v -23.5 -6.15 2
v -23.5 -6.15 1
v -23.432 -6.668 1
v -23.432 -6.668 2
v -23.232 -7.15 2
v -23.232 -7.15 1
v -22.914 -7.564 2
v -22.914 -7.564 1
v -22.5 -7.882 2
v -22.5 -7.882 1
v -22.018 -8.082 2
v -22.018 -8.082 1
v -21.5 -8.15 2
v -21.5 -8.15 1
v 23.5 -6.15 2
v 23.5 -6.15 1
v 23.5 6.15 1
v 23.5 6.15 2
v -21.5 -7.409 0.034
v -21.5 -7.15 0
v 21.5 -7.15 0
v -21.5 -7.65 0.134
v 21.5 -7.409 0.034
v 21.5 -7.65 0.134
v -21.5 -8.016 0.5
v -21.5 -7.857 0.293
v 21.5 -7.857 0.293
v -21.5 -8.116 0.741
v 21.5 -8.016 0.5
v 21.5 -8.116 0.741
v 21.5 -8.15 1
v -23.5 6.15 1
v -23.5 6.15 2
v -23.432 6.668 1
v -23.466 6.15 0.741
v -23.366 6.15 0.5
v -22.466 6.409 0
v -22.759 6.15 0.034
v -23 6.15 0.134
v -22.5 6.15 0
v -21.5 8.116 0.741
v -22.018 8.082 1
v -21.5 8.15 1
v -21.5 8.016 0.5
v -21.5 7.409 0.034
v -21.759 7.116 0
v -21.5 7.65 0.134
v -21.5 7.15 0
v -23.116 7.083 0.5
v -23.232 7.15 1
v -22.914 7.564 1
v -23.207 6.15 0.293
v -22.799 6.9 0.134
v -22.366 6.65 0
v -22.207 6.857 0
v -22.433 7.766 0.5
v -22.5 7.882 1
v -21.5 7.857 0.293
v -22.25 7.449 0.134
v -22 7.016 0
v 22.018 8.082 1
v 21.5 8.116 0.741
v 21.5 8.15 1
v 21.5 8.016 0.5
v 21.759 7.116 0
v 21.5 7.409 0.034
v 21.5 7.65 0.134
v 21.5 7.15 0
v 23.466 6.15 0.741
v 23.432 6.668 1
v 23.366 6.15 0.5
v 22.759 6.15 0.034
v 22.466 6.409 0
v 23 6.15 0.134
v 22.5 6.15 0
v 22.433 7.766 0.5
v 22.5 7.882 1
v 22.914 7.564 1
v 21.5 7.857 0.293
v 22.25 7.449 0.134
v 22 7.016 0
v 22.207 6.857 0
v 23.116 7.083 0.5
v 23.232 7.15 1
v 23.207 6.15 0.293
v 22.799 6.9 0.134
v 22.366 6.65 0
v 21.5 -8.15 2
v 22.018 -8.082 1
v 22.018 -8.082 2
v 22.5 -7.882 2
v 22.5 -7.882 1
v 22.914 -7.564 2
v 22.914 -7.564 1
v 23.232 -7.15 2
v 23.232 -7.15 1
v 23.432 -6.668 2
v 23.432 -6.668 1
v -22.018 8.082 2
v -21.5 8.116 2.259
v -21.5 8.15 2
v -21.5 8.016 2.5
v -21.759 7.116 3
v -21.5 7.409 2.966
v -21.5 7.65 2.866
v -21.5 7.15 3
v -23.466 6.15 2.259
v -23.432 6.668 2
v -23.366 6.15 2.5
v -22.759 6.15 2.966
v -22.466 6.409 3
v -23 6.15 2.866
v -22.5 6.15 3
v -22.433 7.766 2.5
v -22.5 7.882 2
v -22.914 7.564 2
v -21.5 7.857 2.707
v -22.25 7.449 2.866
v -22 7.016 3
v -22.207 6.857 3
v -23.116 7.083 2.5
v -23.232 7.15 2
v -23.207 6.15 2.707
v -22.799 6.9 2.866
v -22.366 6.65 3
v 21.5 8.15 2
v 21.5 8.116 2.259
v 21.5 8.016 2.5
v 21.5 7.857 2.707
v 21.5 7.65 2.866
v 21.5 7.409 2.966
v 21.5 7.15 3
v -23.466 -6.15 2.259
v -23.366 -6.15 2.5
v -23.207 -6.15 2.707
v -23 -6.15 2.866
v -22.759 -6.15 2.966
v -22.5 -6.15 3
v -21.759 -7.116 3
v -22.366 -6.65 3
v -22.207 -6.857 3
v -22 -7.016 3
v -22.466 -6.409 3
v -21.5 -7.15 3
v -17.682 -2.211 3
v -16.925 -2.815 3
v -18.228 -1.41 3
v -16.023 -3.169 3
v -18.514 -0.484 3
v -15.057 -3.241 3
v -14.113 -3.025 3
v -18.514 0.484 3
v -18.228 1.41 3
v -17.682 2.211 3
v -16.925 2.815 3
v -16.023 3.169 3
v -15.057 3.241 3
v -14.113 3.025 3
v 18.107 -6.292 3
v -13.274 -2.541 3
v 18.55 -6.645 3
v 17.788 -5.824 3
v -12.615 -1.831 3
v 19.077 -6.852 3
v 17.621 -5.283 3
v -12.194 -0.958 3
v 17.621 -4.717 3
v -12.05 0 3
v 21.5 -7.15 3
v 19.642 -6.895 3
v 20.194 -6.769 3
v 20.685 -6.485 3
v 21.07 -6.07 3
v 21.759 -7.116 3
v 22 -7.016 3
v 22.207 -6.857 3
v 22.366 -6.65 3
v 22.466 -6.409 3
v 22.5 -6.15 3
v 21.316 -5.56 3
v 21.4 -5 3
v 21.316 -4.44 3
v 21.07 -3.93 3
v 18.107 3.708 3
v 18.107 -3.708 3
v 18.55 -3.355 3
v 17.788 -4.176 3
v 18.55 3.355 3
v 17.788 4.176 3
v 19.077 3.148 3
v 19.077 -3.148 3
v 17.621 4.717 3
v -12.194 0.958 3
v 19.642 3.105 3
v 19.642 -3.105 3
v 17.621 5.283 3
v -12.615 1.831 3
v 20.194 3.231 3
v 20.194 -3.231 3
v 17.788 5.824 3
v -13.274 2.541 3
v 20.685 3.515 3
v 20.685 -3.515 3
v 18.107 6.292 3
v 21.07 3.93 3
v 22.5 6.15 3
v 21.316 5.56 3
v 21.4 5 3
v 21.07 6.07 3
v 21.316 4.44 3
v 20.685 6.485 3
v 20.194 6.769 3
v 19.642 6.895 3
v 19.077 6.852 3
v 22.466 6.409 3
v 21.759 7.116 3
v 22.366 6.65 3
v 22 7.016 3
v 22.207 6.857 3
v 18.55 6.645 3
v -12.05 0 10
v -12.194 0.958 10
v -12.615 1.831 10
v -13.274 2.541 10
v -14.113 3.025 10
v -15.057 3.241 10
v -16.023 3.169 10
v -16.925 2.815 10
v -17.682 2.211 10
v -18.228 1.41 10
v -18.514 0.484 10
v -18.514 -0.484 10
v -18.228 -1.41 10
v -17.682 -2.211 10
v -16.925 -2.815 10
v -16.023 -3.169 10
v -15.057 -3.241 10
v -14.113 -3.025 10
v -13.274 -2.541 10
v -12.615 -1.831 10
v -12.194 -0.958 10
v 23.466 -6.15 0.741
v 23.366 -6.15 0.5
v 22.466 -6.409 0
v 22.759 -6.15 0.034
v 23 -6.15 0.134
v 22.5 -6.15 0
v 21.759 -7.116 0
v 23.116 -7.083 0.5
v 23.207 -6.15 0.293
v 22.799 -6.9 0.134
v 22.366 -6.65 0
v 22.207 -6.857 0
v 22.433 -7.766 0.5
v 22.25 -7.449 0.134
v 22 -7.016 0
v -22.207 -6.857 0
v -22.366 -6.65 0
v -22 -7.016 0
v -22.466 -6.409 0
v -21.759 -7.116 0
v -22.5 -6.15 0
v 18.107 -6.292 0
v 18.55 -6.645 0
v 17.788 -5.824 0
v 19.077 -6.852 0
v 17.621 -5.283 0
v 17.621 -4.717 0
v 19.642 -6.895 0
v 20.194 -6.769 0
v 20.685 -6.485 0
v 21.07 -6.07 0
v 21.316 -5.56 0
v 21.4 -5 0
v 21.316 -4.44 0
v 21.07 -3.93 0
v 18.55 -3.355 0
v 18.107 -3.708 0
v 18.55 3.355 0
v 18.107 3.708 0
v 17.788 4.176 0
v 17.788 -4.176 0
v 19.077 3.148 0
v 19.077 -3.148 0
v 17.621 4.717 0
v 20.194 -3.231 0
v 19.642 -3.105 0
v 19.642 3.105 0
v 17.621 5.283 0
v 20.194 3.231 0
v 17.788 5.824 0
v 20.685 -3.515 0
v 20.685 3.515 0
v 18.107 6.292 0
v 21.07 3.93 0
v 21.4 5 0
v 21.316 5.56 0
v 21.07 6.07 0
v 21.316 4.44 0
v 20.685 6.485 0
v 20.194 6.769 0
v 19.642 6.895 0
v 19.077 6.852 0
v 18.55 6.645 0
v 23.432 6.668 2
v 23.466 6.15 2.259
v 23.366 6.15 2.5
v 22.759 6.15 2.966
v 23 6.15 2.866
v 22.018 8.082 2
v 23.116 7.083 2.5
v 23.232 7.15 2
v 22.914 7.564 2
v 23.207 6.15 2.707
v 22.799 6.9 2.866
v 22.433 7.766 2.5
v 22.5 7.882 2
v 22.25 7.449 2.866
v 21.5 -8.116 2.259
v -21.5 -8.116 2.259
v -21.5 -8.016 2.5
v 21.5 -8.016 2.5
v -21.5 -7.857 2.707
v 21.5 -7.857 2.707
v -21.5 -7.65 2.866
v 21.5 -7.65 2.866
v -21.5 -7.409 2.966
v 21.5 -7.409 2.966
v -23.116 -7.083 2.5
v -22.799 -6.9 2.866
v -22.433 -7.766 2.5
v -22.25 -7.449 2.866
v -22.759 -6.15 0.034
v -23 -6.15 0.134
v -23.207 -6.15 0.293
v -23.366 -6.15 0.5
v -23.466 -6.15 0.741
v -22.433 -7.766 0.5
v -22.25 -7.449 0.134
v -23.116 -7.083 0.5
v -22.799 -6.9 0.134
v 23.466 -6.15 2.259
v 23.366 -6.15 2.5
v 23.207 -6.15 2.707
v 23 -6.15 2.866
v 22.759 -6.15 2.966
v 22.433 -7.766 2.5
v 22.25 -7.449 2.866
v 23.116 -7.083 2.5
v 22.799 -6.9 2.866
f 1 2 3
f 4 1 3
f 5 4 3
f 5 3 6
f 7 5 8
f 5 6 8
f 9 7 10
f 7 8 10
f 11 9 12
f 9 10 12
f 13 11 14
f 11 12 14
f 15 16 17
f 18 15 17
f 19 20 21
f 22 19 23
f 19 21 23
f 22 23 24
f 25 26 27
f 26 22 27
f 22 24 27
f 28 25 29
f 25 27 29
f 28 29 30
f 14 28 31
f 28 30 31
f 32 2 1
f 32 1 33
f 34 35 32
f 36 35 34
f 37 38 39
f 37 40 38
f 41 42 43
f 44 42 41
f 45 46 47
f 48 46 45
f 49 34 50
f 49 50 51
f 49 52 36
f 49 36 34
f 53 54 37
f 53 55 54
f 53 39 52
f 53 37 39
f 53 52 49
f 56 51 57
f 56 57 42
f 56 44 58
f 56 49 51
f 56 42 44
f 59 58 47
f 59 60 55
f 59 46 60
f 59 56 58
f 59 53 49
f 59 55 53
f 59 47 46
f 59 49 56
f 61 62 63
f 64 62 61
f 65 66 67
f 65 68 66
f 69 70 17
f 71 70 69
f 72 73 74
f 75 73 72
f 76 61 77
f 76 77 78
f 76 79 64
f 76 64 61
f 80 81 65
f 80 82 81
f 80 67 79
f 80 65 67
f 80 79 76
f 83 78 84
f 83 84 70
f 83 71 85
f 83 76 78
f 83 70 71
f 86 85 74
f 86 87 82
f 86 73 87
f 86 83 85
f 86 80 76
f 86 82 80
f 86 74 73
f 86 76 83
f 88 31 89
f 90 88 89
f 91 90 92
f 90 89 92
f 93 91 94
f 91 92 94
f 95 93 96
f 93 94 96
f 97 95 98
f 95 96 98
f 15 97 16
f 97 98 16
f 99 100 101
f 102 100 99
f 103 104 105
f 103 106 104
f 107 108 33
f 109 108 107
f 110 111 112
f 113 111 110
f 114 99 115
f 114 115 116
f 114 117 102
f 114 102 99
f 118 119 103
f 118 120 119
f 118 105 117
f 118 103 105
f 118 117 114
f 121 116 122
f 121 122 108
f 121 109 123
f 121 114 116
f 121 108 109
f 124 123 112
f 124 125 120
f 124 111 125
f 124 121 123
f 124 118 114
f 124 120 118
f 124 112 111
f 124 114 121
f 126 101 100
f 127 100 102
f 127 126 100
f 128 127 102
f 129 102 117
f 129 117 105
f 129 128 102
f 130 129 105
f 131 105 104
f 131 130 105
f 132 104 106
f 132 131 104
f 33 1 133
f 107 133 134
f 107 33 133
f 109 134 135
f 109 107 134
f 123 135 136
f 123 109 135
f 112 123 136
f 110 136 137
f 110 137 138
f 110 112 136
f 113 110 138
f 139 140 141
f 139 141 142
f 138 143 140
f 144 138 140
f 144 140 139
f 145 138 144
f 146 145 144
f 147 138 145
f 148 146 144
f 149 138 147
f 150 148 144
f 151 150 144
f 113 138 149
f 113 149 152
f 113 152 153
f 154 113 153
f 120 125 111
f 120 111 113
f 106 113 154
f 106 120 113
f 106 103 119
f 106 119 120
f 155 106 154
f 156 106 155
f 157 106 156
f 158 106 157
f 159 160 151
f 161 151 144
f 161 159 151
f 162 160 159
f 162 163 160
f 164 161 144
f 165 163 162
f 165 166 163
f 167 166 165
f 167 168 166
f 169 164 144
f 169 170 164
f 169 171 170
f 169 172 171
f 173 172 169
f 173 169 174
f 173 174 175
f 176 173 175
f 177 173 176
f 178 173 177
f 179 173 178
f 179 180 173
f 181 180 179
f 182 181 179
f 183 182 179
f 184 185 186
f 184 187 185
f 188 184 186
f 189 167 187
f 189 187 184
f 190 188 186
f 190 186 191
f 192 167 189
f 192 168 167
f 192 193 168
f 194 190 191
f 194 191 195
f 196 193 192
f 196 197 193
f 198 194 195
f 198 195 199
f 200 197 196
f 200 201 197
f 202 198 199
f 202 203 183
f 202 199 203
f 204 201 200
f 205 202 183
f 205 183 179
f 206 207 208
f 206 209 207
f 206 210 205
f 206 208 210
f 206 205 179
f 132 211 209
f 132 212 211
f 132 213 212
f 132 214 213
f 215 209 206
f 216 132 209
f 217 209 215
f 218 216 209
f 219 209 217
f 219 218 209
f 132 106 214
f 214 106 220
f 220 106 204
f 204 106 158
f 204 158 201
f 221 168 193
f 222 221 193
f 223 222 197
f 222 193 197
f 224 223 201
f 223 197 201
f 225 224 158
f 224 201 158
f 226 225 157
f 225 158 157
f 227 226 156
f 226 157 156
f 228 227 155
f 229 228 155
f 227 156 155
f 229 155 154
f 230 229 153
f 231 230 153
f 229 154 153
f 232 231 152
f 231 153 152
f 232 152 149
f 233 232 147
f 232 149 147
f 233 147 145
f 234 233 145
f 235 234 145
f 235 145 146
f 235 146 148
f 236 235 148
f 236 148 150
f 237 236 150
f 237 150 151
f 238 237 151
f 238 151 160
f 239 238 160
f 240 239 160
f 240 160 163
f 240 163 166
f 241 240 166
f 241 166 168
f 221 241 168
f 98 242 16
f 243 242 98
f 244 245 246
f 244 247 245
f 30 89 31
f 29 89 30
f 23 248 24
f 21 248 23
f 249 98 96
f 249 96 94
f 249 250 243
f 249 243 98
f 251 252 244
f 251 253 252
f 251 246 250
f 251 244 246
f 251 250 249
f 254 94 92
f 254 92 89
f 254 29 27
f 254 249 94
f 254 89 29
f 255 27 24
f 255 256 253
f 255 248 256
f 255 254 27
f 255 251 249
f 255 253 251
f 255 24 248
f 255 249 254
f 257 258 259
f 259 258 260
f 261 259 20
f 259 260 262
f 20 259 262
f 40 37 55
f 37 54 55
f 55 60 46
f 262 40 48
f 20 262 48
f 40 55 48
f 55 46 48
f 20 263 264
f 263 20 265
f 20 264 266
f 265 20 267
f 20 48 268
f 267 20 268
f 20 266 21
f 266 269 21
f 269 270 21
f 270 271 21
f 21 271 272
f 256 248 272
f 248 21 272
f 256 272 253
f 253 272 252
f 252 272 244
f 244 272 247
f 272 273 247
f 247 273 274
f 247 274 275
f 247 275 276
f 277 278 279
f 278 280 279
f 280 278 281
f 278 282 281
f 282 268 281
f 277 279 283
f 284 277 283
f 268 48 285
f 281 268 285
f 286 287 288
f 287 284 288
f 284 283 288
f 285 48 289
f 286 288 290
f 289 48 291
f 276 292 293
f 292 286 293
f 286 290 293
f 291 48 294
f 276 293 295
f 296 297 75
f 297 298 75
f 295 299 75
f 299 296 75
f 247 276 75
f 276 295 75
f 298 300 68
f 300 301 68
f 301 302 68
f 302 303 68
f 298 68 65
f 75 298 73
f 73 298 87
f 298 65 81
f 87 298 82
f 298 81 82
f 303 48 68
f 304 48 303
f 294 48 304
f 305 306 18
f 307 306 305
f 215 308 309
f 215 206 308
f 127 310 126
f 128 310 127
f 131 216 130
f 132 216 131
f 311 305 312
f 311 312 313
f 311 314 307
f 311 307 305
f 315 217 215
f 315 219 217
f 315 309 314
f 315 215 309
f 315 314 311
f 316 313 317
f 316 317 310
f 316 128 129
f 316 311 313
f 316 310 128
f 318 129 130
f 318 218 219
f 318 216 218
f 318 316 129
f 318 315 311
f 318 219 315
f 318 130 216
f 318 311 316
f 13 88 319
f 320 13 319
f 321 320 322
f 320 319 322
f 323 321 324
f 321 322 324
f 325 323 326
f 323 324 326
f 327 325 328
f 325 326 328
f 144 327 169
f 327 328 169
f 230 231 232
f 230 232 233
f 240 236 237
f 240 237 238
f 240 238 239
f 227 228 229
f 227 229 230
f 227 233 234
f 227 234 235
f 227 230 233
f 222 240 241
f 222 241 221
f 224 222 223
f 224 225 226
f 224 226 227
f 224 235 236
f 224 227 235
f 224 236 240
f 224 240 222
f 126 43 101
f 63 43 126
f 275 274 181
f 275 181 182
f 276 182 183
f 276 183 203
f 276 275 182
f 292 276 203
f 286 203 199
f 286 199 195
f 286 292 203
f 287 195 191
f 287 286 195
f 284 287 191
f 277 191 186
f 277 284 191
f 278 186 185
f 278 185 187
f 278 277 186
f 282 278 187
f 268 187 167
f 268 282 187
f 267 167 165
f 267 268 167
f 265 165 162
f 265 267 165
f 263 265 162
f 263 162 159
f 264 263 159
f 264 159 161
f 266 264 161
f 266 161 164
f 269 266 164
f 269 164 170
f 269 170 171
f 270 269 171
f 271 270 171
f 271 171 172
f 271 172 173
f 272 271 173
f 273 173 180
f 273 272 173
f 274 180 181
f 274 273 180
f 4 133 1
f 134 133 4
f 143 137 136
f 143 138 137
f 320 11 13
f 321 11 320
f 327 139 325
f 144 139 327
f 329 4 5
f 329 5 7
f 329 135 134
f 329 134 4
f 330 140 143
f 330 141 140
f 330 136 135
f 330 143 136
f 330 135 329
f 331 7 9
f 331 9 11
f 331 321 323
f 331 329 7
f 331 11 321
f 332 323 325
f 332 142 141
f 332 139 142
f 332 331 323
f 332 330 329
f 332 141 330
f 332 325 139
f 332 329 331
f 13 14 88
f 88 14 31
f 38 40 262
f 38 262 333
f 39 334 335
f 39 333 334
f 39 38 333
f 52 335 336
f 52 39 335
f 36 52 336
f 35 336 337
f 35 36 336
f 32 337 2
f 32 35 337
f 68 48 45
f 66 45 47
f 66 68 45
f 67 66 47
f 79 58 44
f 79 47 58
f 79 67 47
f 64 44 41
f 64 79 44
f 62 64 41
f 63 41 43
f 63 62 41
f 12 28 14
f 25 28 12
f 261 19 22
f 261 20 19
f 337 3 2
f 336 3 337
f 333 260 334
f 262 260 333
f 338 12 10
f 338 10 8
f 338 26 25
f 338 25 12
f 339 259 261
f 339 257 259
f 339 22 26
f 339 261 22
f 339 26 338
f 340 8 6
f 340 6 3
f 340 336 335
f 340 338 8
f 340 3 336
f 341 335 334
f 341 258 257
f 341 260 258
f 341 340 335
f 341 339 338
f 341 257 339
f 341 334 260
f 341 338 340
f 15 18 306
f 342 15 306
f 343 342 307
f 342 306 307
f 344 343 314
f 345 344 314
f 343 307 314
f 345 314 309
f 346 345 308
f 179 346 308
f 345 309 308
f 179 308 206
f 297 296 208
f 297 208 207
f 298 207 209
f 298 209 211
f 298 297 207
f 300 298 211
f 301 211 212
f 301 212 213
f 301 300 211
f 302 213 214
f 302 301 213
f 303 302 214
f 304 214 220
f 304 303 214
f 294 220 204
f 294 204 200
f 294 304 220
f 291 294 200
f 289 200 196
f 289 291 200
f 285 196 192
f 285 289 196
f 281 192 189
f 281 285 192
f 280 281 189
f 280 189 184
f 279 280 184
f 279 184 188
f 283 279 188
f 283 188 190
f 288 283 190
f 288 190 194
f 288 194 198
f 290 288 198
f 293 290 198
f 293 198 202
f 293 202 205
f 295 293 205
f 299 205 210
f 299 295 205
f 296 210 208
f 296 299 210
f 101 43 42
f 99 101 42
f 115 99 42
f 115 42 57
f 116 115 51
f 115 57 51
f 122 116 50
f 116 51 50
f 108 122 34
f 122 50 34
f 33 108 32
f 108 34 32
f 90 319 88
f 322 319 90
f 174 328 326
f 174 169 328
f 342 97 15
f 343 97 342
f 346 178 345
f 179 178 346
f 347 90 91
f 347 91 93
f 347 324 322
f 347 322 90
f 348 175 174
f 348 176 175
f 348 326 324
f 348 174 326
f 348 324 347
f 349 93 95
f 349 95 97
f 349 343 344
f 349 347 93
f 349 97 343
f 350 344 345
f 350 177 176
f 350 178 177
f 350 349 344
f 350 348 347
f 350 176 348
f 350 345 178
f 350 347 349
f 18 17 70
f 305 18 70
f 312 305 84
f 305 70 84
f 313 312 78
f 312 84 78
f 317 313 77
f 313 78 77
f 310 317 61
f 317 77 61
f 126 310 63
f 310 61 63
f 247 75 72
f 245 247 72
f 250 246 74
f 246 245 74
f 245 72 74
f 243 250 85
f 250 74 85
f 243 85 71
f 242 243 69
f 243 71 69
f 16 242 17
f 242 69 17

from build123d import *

# Parameters (mm, degrees)
SKETCH1_W           = 47
SKETCH1_H           = 16.3
SKETCH1_R           = 1.9
BOSS_EXTRUDE1_DEPTH = 3
SKETCH2_R           = 3.25
BOSS_EXTRUDE2_DEPTH = 10
FILLET1_R           = 1
FILLET2_R           = 2


with BuildPart() as part:
    # Sketch1 → Boss-Extrude1 (new body)
    with BuildSketch(Plane.XY):
        Rectangle(SKETCH1_W, SKETCH1_H)
        with Locations((19.5, 5)):
            Circle(SKETCH1_R, mode=Mode.SUBTRACT)
        with Locations((19.5, -5)):
            Circle(SKETCH1_R, mode=Mode.SUBTRACT)
    extrude(amount=BOSS_EXTRUDE1_DEPTH)

    # Sketch2 → Boss-Extrude2 (add)
    with BuildSketch(Plane.XY):
        with Locations((-15.3, 0)):
            Circle(SKETCH2_R)
    extrude(amount=BOSS_EXTRUDE2_DEPTH)

    # Fillet1
    fillet1_edges = [part.edges().sort_by_distance(p)[0] for p in [
        (-23.5, 0, 3),
        (0, -8.15, 3),
        (23.5, 0, 3),
        (0, -8.15, 0),
        (-23.5, 0, 0),
        (0, 8.15, 0),
        (23.5, 0, 0),
        (0, 8.15, 3),
    ]]
    fillet(fillet1_edges, radius=FILLET1_R)

    # Fillet2
    # the kernel refuses this fillet: 2 mm, written as the material it takes off along each edge
    with BuildSketch(Plane(origin=(-21.5, -6.15, 0), x_dir=(0, -1, 0), z_dir=(1, 0, 0))) as fillet2_piece_1:
        with BuildLine():
            CenterArc((1, -1), 1, 0, 90)
            Line((2, -1), (2, 0))
            Line((2, 0), (1, 0))
        make_face()
    revolve(axis=Axis((-21.5, -6.15, 0), (0, 0, -1)), revolution_arc=90, mode=Mode.SUBTRACT)
    with BuildSketch(Plane(origin=(-21.5, 6.15, 0), x_dir=(-1, 0, 0), z_dir=(0, -1, 0))) as fillet2_piece_2:
        with BuildLine():
            CenterArc((1, -1), 1, 0, 90)
            Line((2, -1), (2, 0))
            Line((2, 0), (1, 0))
        make_face()
    revolve(axis=Axis((-21.5, 6.15, 0), (0, 0, -1)), revolution_arc=90, mode=Mode.SUBTRACT)
    with BuildSketch(Plane(origin=(21.5, -6.15, 0), x_dir=(1, 0, 0), z_dir=(0, 1, 0))) as fillet2_piece_3:
        with BuildLine():
            CenterArc((1, -1), 1, 0, 90)
            Line((2, -1), (2, 0))
            Line((2, 0), (1, 0))
        make_face()
    revolve(axis=Axis((21.5, -6.15, 0), (0, 0, -1)), revolution_arc=90, mode=Mode.SUBTRACT)
    with BuildSketch(Plane(origin=(21.5, 6.15, 0), x_dir=(0, 1, 0), z_dir=(-1, 0, 0))) as fillet2_piece_4:
        with BuildLine():
            CenterArc((1, -1), 1, 0, 90)
            Line((2, -1), (2, 0))
            Line((2, 0), (1, 0))
        make_face()
    revolve(axis=Axis((21.5, 6.15, 0), (0, 0, -1)), revolution_arc=90, mode=Mode.SUBTRACT)
    with BuildSketch(Plane(origin=(21.5, -6.15, 3), x_dir=(0, -1, 0), z_dir=(-1, 0, 0))) as fillet2_piece_5:
        with BuildLine():
            CenterArc((1, -1), 1, 0, 90)
            Line((2, -1), (2, 0))
            Line((2, 0), (1, 0))
        make_face()
    revolve(axis=Axis((21.5, -6.15, 3), (0, 0, 1)), revolution_arc=90, mode=Mode.SUBTRACT)
    with BuildSketch(Plane(origin=(-21.5, -6.15, 3), x_dir=(-1, 0, 0), z_dir=(0, 1, 0))) as fillet2_piece_6:
        with BuildLine():
            CenterArc((1, -1), 1, 0, 90)
            Line((2, -1), (2, 0))
            Line((2, 0), (1, 0))
        make_face()
    revolve(axis=Axis((-21.5, -6.15, 3), (0, 0, 1)), revolution_arc=90, mode=Mode.SUBTRACT)
    with BuildSketch(Plane(origin=(21.5, 6.15, 3), x_dir=(1, 0, 0), z_dir=(0, -1, 0))) as fillet2_piece_7:
        with BuildLine():
            CenterArc((1, -1), 1, 0, 90)
            Line((2, -1), (2, 0))
            Line((2, 0), (1, 0))
        make_face()
    revolve(axis=Axis((21.5, 6.15, 3), (0, 0, 1)), revolution_arc=90, mode=Mode.SUBTRACT)
    with BuildSketch(Plane(origin=(-21.5, 6.15, 3), x_dir=(0, 1, 0), z_dir=(1, 0, 0))) as fillet2_piece_8:
        with BuildLine():
            CenterArc((1, -1), 1, 0, 90)
            Line((2, -1), (2, 0))
            Line((2, 0), (1, 0))
        make_face()
    revolve(axis=Axis((-21.5, 6.15, 3), (0, 0, 1)), revolution_arc=90, mode=Mode.SUBTRACT)
    with BuildSketch(Plane(origin=(23.5, 8.15, 0), x_dir=(-1, 0, 0), z_dir=(0, 0, 1)), Plane(origin=(23.5, -8.15, 0), x_dir=(0, 1, 0), z_dir=(0, 0, 1))) as fillet2_piece_9:
        with BuildLine():
            CenterArc((FILLET2_R, FILLET2_R), FILLET2_R, 180, 90)
            Line((0, FILLET2_R), (0, 0))
            Line((0, 0), (FILLET2_R, 0))
        make_face()
    extrude(amount=3, mode=Mode.SUBTRACT)
    with BuildSketch(Plane(origin=(-23.5, -8.15, 0), x_dir=(0, 1, 0), z_dir=(0, 0, 1)), Plane(origin=(-23.5, 8.15, 0), x_dir=(1, 0, 0), z_dir=(0, 0, 1))) as fillet2_piece_10:
        with BuildLine():
            CenterArc((FILLET2_R, -FILLET2_R), FILLET2_R, 90, 90)
            Line((0, -FILLET2_R), (0, 0))
            Line((0, 0), (FILLET2_R, 0))
        make_face()
    extrude(amount=3, mode=Mode.SUBTRACT)


solid = part.part
